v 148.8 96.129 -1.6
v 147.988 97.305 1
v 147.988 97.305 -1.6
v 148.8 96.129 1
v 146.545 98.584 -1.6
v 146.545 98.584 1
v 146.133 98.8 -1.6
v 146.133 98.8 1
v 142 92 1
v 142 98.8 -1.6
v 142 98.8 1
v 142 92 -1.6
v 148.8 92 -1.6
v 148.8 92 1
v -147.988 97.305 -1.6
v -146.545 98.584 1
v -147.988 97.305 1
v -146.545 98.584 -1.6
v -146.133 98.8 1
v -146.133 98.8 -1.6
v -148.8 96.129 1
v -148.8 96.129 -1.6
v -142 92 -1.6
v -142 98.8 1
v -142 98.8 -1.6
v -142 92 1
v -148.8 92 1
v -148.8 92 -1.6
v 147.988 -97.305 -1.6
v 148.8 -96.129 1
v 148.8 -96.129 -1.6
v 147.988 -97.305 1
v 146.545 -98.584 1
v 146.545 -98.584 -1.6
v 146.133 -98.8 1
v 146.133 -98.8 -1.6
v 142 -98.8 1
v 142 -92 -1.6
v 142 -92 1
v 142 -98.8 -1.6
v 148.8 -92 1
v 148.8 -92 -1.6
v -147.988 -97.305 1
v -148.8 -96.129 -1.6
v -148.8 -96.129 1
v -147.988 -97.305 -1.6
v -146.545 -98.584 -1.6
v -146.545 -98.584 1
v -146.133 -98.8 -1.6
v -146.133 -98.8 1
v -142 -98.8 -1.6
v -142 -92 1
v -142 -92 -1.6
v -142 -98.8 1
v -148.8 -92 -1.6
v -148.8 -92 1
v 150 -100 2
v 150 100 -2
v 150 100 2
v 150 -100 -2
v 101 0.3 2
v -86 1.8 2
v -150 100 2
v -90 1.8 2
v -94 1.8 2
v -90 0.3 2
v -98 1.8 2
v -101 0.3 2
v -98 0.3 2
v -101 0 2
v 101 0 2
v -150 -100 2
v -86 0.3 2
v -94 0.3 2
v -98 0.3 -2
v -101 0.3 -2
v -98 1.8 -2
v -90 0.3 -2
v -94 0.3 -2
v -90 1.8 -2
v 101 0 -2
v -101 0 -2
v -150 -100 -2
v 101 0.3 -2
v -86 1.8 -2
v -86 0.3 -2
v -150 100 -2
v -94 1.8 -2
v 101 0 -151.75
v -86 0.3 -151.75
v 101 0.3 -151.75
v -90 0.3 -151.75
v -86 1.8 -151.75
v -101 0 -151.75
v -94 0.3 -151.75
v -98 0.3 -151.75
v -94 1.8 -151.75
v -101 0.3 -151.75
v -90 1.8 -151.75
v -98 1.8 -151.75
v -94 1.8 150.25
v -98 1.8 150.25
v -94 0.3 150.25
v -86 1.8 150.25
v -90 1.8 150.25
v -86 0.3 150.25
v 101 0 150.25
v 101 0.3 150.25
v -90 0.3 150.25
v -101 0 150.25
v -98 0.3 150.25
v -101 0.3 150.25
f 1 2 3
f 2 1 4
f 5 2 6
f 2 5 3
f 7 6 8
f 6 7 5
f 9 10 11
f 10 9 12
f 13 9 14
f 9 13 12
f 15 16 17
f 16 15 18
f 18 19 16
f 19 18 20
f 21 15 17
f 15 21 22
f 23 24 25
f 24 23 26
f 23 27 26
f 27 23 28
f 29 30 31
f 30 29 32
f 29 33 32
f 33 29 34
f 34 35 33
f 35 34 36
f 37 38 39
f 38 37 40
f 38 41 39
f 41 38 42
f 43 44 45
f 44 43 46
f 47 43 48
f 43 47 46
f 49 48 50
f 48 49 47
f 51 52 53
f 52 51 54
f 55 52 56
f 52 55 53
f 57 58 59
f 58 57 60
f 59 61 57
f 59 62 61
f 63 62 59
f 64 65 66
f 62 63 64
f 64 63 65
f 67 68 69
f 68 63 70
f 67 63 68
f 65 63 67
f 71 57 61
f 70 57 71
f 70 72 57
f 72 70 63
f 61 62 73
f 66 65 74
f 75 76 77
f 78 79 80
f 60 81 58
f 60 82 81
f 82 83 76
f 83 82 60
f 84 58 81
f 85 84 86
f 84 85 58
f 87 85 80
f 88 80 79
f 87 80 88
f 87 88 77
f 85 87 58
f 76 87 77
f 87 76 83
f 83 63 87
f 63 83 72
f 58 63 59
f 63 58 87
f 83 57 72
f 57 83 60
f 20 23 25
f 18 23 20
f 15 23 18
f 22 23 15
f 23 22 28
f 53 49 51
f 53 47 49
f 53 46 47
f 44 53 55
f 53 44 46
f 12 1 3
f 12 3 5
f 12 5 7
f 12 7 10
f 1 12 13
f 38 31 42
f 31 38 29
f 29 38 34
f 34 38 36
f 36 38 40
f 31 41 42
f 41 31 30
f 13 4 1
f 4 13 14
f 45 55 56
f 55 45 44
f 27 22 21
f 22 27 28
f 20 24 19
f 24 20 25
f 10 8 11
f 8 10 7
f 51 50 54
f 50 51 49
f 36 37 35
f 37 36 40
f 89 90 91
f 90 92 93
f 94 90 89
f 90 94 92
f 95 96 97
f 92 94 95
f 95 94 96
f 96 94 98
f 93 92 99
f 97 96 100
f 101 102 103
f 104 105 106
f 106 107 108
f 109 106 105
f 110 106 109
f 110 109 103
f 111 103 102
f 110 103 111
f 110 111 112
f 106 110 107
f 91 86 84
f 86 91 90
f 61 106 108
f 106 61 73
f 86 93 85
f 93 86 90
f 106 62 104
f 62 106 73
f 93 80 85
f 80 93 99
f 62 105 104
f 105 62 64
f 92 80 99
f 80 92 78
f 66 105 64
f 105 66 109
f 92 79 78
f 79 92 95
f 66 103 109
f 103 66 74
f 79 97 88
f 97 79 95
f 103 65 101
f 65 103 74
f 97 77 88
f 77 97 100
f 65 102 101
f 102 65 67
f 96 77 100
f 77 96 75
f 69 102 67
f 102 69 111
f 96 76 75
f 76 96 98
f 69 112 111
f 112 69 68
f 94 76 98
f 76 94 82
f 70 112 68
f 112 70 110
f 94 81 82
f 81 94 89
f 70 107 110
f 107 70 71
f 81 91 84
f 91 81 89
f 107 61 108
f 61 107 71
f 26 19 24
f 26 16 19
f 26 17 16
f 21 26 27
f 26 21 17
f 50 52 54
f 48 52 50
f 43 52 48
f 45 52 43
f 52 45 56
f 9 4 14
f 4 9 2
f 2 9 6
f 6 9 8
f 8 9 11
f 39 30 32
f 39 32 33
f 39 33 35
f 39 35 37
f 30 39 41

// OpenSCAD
// Parameters
sheet_L = 300; //[150:600:1]
sheet_W = 200; //[100:400:1]
sheet_T = 4; //[2:8:0.1]
flute_pitch = 8; //[4:16:0.1]
flute_amp = 1.5; //[0.75:3:0.05]
liner_T = 0.4; //[0.2:0.8:0.05]
core_web_T = 0.3; //[0.15:0.6:0.05]
corner_R = 8; //[2:20:0.5]
edge_exposure_T = 1.2; //[0.6:2.4:0.1]
edge_overlap = 1; //[0.5:2:0.1]
flute_dir_L = 1; //[0:1:1]

// Base Shapes
module sheet_panel_raw() {
  cube([sheet_L, sheet_W, sheet_T], center=true);
}

module corner_cut_cyl() {
  cylinder(r=corner_R, h=sheet_T + 2*edge_overlap, center=true);
}

module corner_cut_box() {
  cube([corner_R, corner_R, sheet_T + 2*edge_overlap], center=true);
}

module liner_top() {
  translate([0, 0, sheet_T/2 - liner_T/2])
    cube([sheet_L, sheet_W, liner_T], center=true);
}

module liner_bottom() {
  translate([0, 0, -sheet_T/2 + liner_T/2])
    cube([sheet_L, sheet_W, liner_T], center=true);
}

module corrugation_profile() {
  linear_extrude(height=sheet_L + 2*edge_overlap, center=true) {
    polygon(points=[
      [-sheet_W/2 - edge_overlap, 0],
      [-sheet_W/2 - edge_overlap, core_web_T],
      [-sheet_W/2 + flute_pitch/4, core_web_T],
      [-sheet_W/2 + flute_pitch/4, flute_amp + core_web_T],
      [-sheet_W/2 + 3*flute_pitch/4, flute_amp + core_web_T],
      [-sheet_W/2 + 3*flute_pitch/4, core_web_T],
      [-sheet_W/2 + 5*flute_pitch/4, core_web_T],
      [-sheet_W/2 + 5*flute_pitch/4, flute_amp + core_web_T],
      [-sheet_W/2 + 7*flute_pitch/4, flute_amp + core_web_T],
      [-sheet_W/2 + 7*flute_pitch/4, core_web_T],
      [sheet_W/2 + edge_overlap, core_web_T],
      [sheet_W/2 + edge_overlap, 0]
    ]);
  }
}

module edge_flute_exposure_x() {
  translate([sheet_L/2 - edge_exposure_T/2, 0, 0])
    cube([edge_exposure_T, sheet_W, sheet_T], center=true);
}

module edge_flute_exposure_x_mirror() {
  translate([-sheet_L/2 + edge_exposure_T/2, 0, 0])
    cube([edge_exposure_T, sheet_W, sheet_T], center=true);
}

module edge_flute_exposure_y() {
  translate([0, sheet_W/2 - edge_exposure_T/2, 0])
    cube([sheet_L, edge_exposure_T, sheet_T], center=true);
}

module edge_flute_exposure_y_mirror() {
  translate([0, -sheet_W/2 + edge_exposure_T/2, 0])
    cube([sheet_L, edge_exposure_T, sheet_T], center=true);
}

module material_texture() {
  translate([0, 0, sheet_T/2 - edge_overlap/2])
    cube([sheet_L, sheet_W, edge_overlap], center=true);
}

// Operations
module corner_quarter_ne() {
  intersection() {
    translate([sheet_L/2 - corner_R, sheet_W/2 - corner_R, 0]) corner_cut_cyl();
    translate([sheet_L/2 - corner_R/2, sheet_W/2 - corner_R/2, 0]) corner_cut_box();
  }
}

module corner_quarter_nw() {
  intersection() {
    translate([-sheet_L/2 + corner_R, sheet_W/2 - corner_R, 0]) corner_cut_cyl();
    translate([-sheet_L/2 + corner_R/2, sheet_W/2 - corner_R/2, 0]) corner_cut_box();
  }
}

module corner_quarter_se() {
  intersection() {
    translate([sheet_L/2 - corner_R, -sheet_W/2 + corner_R, 0]) corner_cut_cyl();
    translate([sheet_L/2 - corner_R/2, -sheet_W/2 + corner_R/2, 0]) corner_cut_box();
  }
}

module corner_quarter_sw() {
  intersection() {
    translate([-sheet_L/2 + corner_R, -sheet_W/2 + corner_R, 0]) corner_cut_cyl();
    translate([-sheet_L/2 + corner_R/2, -sheet_W/2 + corner_R/2, 0]) corner_cut_box();
  }
}

module sheet_panel() {
  difference() {
    sheet_panel_raw();
    corner_quarter_ne();
    corner_quarter_nw();
    corner_quarter_se();
    corner_quarter_sw();
  }
}

module kraft_liner_layers() {
  union() {
    liner_top();
    liner_bottom();
  }
}

module edge_flute_exposure() {
  union() {
    edge_flute_exposure_x();
    edge_flute_exposure_x_mirror();
    edge_flute_exposure_y();
    edge_flute_exposure_y_mirror();
  }
}

module rounded_corners() {
  union() {
    sheet_panel();
    kraft_liner_layers();
    translate([0, 0, -sheet_T/2 + liner_T + (sheet_T - 2*liner_T)/2 - flute_amp/2]) corrugation_profile();
    edge_flute_exposure();
    material_texture();
  }
}

// Final Output
rounded_corners();
